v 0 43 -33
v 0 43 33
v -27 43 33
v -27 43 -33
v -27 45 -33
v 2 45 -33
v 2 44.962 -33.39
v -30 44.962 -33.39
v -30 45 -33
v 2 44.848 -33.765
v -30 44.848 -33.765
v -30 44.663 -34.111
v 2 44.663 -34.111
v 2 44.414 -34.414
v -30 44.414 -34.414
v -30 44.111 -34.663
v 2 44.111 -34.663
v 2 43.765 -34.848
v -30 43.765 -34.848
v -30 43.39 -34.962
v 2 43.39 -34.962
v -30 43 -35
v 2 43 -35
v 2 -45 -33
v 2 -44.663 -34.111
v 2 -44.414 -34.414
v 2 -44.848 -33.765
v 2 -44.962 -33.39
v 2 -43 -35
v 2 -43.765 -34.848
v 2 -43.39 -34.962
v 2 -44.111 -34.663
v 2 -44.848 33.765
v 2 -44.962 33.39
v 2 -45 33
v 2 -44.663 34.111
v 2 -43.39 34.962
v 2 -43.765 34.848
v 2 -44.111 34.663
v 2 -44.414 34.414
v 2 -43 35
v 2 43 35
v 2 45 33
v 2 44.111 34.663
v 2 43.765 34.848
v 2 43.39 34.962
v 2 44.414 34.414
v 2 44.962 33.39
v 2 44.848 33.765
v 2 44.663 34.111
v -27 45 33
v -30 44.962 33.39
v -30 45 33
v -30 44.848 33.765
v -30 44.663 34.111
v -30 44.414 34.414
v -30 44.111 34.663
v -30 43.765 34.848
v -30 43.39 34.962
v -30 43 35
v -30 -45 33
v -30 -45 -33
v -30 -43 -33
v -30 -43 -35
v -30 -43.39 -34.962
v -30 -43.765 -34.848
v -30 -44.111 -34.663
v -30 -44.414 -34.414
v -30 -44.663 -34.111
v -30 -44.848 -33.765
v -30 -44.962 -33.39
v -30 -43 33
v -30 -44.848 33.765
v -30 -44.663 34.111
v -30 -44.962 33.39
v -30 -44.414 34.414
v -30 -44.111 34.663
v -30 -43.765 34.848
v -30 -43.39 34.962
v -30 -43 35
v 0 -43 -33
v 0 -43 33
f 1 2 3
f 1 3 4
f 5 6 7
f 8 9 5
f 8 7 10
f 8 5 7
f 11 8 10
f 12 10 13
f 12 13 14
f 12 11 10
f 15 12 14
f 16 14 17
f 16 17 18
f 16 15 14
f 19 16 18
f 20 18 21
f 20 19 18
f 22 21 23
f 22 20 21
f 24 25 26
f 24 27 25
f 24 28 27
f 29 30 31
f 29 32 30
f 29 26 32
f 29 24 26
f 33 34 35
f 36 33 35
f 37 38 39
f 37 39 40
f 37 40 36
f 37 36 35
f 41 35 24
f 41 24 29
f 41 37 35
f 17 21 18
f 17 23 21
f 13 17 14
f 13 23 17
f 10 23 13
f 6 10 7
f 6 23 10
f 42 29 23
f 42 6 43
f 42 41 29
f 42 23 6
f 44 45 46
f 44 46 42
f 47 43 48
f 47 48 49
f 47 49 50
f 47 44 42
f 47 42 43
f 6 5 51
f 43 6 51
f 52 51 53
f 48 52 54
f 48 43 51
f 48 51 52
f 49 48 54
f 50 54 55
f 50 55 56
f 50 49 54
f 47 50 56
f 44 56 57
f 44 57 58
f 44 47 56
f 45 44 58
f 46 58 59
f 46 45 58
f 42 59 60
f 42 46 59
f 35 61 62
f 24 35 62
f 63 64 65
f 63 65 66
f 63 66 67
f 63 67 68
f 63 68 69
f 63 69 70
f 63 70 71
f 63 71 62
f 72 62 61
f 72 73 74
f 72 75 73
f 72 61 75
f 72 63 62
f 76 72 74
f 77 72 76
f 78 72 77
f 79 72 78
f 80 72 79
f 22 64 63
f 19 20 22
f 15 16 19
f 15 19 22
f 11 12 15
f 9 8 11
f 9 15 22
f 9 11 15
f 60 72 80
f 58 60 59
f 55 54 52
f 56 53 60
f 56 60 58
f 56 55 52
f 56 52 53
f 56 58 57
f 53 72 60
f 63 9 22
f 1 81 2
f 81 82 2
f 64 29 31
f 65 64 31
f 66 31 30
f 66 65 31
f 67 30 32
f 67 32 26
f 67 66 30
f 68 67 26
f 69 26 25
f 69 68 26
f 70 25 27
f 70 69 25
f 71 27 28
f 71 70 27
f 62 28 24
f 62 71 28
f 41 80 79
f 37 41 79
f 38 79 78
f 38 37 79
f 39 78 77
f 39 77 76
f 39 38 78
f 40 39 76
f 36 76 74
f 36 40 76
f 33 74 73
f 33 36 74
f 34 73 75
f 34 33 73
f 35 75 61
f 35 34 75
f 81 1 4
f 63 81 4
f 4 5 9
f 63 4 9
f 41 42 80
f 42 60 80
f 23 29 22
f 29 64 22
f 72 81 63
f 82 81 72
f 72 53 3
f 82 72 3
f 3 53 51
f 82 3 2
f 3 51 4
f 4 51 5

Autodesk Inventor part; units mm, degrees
ref_plane "YZ Plane" through (0, 0, 0) normal (1, 0, 0) x (0, 1, 0)
ref_plane "XZ Plane" through (0, 0, 0) normal (0, 1, 0) x (-1, 0, 0)
ref_plane "XY Plane" through (0, 0, 0) normal (0, 0, 1) x (1, 0, 0)
sketch "Esquisse1" plane through (0, 0, 0) normal (1, 0, 0) x (0, 1, 0)
  line L0 (45, 35) -> (-45, 35)
  line L1 (-45, 35) -> (-45, -35)
  line L2 (-45, -35) -> (45, -35)
  line L3 (45, -35) -> (45, 35)
  line L4 (0, 39.01) -> (0, -54.7883) construction
  line L5 (27.6574, 0) -> (-32.6664, 0) construction
  point P0 (0, 0)
  dimension "d0" = 70
  dimension "d1" = 90
extrude "Extrusion1" add sketch "Esquisse1" along normal blind 2
sketch "Esquisse2" plane through (0, 0, 0) normal (-1, 0, 0) x (0, 0, 1)
  line L0 (35, -45) -> (-35, -45) projected
  line L1 (-35, 45) -> (35, 45) projected
  line L2 (-35, -45) -> (35, -45)
  line L3 (35, -45) -> (35, 45)
  line L4 (35, 45) -> (-35, 45)
  line L5 (-35, 45) -> (-35, -45)
  line L6 (-33, -43) -> (33, -43)
  line L7 (33, -43) -> (33, 43)
  line L8 (33, 43) -> (-33, 43)
  line L9 (-33, 43) -> (-33, -43)
  point P0 (0, 0)
  dimension "d4" = 2
  dimension "d5" = 2
  dimension "d6" = 2
  dimension "d7" = 2
extrude "Extrusion2" add sketch "Esquisse2" along normal blind 30
fillet "Congé1" radius 2 2 edges at (-14, 45, 35) (-14, -45, 35)
fillet "Congé2" radius 2 2 edges at (-14, 45, -35) (-14, -45, -35)
sketch "Esquisse11" plane through (-30, 45, 33) normal (0, 1, 0) x (1, 0, 0)
  line L0 (0, 66) -> (0, 0) projected
  line L1 (30, 66) -> (0, 66) projected
  line L2 (0, 0) -> (3, 0)
  line L3 (3, 0) -> (3, 66)
  line L4 (3, 66) -> (0, 66)
  line L5 (0, 66) -> (0, 0)
  point P0 (30, 33)
  dimension "d79" = 3
extrude "Extrusion11" cut sketch "Esquisse11" against normal blind 10
properties part number "Base"
